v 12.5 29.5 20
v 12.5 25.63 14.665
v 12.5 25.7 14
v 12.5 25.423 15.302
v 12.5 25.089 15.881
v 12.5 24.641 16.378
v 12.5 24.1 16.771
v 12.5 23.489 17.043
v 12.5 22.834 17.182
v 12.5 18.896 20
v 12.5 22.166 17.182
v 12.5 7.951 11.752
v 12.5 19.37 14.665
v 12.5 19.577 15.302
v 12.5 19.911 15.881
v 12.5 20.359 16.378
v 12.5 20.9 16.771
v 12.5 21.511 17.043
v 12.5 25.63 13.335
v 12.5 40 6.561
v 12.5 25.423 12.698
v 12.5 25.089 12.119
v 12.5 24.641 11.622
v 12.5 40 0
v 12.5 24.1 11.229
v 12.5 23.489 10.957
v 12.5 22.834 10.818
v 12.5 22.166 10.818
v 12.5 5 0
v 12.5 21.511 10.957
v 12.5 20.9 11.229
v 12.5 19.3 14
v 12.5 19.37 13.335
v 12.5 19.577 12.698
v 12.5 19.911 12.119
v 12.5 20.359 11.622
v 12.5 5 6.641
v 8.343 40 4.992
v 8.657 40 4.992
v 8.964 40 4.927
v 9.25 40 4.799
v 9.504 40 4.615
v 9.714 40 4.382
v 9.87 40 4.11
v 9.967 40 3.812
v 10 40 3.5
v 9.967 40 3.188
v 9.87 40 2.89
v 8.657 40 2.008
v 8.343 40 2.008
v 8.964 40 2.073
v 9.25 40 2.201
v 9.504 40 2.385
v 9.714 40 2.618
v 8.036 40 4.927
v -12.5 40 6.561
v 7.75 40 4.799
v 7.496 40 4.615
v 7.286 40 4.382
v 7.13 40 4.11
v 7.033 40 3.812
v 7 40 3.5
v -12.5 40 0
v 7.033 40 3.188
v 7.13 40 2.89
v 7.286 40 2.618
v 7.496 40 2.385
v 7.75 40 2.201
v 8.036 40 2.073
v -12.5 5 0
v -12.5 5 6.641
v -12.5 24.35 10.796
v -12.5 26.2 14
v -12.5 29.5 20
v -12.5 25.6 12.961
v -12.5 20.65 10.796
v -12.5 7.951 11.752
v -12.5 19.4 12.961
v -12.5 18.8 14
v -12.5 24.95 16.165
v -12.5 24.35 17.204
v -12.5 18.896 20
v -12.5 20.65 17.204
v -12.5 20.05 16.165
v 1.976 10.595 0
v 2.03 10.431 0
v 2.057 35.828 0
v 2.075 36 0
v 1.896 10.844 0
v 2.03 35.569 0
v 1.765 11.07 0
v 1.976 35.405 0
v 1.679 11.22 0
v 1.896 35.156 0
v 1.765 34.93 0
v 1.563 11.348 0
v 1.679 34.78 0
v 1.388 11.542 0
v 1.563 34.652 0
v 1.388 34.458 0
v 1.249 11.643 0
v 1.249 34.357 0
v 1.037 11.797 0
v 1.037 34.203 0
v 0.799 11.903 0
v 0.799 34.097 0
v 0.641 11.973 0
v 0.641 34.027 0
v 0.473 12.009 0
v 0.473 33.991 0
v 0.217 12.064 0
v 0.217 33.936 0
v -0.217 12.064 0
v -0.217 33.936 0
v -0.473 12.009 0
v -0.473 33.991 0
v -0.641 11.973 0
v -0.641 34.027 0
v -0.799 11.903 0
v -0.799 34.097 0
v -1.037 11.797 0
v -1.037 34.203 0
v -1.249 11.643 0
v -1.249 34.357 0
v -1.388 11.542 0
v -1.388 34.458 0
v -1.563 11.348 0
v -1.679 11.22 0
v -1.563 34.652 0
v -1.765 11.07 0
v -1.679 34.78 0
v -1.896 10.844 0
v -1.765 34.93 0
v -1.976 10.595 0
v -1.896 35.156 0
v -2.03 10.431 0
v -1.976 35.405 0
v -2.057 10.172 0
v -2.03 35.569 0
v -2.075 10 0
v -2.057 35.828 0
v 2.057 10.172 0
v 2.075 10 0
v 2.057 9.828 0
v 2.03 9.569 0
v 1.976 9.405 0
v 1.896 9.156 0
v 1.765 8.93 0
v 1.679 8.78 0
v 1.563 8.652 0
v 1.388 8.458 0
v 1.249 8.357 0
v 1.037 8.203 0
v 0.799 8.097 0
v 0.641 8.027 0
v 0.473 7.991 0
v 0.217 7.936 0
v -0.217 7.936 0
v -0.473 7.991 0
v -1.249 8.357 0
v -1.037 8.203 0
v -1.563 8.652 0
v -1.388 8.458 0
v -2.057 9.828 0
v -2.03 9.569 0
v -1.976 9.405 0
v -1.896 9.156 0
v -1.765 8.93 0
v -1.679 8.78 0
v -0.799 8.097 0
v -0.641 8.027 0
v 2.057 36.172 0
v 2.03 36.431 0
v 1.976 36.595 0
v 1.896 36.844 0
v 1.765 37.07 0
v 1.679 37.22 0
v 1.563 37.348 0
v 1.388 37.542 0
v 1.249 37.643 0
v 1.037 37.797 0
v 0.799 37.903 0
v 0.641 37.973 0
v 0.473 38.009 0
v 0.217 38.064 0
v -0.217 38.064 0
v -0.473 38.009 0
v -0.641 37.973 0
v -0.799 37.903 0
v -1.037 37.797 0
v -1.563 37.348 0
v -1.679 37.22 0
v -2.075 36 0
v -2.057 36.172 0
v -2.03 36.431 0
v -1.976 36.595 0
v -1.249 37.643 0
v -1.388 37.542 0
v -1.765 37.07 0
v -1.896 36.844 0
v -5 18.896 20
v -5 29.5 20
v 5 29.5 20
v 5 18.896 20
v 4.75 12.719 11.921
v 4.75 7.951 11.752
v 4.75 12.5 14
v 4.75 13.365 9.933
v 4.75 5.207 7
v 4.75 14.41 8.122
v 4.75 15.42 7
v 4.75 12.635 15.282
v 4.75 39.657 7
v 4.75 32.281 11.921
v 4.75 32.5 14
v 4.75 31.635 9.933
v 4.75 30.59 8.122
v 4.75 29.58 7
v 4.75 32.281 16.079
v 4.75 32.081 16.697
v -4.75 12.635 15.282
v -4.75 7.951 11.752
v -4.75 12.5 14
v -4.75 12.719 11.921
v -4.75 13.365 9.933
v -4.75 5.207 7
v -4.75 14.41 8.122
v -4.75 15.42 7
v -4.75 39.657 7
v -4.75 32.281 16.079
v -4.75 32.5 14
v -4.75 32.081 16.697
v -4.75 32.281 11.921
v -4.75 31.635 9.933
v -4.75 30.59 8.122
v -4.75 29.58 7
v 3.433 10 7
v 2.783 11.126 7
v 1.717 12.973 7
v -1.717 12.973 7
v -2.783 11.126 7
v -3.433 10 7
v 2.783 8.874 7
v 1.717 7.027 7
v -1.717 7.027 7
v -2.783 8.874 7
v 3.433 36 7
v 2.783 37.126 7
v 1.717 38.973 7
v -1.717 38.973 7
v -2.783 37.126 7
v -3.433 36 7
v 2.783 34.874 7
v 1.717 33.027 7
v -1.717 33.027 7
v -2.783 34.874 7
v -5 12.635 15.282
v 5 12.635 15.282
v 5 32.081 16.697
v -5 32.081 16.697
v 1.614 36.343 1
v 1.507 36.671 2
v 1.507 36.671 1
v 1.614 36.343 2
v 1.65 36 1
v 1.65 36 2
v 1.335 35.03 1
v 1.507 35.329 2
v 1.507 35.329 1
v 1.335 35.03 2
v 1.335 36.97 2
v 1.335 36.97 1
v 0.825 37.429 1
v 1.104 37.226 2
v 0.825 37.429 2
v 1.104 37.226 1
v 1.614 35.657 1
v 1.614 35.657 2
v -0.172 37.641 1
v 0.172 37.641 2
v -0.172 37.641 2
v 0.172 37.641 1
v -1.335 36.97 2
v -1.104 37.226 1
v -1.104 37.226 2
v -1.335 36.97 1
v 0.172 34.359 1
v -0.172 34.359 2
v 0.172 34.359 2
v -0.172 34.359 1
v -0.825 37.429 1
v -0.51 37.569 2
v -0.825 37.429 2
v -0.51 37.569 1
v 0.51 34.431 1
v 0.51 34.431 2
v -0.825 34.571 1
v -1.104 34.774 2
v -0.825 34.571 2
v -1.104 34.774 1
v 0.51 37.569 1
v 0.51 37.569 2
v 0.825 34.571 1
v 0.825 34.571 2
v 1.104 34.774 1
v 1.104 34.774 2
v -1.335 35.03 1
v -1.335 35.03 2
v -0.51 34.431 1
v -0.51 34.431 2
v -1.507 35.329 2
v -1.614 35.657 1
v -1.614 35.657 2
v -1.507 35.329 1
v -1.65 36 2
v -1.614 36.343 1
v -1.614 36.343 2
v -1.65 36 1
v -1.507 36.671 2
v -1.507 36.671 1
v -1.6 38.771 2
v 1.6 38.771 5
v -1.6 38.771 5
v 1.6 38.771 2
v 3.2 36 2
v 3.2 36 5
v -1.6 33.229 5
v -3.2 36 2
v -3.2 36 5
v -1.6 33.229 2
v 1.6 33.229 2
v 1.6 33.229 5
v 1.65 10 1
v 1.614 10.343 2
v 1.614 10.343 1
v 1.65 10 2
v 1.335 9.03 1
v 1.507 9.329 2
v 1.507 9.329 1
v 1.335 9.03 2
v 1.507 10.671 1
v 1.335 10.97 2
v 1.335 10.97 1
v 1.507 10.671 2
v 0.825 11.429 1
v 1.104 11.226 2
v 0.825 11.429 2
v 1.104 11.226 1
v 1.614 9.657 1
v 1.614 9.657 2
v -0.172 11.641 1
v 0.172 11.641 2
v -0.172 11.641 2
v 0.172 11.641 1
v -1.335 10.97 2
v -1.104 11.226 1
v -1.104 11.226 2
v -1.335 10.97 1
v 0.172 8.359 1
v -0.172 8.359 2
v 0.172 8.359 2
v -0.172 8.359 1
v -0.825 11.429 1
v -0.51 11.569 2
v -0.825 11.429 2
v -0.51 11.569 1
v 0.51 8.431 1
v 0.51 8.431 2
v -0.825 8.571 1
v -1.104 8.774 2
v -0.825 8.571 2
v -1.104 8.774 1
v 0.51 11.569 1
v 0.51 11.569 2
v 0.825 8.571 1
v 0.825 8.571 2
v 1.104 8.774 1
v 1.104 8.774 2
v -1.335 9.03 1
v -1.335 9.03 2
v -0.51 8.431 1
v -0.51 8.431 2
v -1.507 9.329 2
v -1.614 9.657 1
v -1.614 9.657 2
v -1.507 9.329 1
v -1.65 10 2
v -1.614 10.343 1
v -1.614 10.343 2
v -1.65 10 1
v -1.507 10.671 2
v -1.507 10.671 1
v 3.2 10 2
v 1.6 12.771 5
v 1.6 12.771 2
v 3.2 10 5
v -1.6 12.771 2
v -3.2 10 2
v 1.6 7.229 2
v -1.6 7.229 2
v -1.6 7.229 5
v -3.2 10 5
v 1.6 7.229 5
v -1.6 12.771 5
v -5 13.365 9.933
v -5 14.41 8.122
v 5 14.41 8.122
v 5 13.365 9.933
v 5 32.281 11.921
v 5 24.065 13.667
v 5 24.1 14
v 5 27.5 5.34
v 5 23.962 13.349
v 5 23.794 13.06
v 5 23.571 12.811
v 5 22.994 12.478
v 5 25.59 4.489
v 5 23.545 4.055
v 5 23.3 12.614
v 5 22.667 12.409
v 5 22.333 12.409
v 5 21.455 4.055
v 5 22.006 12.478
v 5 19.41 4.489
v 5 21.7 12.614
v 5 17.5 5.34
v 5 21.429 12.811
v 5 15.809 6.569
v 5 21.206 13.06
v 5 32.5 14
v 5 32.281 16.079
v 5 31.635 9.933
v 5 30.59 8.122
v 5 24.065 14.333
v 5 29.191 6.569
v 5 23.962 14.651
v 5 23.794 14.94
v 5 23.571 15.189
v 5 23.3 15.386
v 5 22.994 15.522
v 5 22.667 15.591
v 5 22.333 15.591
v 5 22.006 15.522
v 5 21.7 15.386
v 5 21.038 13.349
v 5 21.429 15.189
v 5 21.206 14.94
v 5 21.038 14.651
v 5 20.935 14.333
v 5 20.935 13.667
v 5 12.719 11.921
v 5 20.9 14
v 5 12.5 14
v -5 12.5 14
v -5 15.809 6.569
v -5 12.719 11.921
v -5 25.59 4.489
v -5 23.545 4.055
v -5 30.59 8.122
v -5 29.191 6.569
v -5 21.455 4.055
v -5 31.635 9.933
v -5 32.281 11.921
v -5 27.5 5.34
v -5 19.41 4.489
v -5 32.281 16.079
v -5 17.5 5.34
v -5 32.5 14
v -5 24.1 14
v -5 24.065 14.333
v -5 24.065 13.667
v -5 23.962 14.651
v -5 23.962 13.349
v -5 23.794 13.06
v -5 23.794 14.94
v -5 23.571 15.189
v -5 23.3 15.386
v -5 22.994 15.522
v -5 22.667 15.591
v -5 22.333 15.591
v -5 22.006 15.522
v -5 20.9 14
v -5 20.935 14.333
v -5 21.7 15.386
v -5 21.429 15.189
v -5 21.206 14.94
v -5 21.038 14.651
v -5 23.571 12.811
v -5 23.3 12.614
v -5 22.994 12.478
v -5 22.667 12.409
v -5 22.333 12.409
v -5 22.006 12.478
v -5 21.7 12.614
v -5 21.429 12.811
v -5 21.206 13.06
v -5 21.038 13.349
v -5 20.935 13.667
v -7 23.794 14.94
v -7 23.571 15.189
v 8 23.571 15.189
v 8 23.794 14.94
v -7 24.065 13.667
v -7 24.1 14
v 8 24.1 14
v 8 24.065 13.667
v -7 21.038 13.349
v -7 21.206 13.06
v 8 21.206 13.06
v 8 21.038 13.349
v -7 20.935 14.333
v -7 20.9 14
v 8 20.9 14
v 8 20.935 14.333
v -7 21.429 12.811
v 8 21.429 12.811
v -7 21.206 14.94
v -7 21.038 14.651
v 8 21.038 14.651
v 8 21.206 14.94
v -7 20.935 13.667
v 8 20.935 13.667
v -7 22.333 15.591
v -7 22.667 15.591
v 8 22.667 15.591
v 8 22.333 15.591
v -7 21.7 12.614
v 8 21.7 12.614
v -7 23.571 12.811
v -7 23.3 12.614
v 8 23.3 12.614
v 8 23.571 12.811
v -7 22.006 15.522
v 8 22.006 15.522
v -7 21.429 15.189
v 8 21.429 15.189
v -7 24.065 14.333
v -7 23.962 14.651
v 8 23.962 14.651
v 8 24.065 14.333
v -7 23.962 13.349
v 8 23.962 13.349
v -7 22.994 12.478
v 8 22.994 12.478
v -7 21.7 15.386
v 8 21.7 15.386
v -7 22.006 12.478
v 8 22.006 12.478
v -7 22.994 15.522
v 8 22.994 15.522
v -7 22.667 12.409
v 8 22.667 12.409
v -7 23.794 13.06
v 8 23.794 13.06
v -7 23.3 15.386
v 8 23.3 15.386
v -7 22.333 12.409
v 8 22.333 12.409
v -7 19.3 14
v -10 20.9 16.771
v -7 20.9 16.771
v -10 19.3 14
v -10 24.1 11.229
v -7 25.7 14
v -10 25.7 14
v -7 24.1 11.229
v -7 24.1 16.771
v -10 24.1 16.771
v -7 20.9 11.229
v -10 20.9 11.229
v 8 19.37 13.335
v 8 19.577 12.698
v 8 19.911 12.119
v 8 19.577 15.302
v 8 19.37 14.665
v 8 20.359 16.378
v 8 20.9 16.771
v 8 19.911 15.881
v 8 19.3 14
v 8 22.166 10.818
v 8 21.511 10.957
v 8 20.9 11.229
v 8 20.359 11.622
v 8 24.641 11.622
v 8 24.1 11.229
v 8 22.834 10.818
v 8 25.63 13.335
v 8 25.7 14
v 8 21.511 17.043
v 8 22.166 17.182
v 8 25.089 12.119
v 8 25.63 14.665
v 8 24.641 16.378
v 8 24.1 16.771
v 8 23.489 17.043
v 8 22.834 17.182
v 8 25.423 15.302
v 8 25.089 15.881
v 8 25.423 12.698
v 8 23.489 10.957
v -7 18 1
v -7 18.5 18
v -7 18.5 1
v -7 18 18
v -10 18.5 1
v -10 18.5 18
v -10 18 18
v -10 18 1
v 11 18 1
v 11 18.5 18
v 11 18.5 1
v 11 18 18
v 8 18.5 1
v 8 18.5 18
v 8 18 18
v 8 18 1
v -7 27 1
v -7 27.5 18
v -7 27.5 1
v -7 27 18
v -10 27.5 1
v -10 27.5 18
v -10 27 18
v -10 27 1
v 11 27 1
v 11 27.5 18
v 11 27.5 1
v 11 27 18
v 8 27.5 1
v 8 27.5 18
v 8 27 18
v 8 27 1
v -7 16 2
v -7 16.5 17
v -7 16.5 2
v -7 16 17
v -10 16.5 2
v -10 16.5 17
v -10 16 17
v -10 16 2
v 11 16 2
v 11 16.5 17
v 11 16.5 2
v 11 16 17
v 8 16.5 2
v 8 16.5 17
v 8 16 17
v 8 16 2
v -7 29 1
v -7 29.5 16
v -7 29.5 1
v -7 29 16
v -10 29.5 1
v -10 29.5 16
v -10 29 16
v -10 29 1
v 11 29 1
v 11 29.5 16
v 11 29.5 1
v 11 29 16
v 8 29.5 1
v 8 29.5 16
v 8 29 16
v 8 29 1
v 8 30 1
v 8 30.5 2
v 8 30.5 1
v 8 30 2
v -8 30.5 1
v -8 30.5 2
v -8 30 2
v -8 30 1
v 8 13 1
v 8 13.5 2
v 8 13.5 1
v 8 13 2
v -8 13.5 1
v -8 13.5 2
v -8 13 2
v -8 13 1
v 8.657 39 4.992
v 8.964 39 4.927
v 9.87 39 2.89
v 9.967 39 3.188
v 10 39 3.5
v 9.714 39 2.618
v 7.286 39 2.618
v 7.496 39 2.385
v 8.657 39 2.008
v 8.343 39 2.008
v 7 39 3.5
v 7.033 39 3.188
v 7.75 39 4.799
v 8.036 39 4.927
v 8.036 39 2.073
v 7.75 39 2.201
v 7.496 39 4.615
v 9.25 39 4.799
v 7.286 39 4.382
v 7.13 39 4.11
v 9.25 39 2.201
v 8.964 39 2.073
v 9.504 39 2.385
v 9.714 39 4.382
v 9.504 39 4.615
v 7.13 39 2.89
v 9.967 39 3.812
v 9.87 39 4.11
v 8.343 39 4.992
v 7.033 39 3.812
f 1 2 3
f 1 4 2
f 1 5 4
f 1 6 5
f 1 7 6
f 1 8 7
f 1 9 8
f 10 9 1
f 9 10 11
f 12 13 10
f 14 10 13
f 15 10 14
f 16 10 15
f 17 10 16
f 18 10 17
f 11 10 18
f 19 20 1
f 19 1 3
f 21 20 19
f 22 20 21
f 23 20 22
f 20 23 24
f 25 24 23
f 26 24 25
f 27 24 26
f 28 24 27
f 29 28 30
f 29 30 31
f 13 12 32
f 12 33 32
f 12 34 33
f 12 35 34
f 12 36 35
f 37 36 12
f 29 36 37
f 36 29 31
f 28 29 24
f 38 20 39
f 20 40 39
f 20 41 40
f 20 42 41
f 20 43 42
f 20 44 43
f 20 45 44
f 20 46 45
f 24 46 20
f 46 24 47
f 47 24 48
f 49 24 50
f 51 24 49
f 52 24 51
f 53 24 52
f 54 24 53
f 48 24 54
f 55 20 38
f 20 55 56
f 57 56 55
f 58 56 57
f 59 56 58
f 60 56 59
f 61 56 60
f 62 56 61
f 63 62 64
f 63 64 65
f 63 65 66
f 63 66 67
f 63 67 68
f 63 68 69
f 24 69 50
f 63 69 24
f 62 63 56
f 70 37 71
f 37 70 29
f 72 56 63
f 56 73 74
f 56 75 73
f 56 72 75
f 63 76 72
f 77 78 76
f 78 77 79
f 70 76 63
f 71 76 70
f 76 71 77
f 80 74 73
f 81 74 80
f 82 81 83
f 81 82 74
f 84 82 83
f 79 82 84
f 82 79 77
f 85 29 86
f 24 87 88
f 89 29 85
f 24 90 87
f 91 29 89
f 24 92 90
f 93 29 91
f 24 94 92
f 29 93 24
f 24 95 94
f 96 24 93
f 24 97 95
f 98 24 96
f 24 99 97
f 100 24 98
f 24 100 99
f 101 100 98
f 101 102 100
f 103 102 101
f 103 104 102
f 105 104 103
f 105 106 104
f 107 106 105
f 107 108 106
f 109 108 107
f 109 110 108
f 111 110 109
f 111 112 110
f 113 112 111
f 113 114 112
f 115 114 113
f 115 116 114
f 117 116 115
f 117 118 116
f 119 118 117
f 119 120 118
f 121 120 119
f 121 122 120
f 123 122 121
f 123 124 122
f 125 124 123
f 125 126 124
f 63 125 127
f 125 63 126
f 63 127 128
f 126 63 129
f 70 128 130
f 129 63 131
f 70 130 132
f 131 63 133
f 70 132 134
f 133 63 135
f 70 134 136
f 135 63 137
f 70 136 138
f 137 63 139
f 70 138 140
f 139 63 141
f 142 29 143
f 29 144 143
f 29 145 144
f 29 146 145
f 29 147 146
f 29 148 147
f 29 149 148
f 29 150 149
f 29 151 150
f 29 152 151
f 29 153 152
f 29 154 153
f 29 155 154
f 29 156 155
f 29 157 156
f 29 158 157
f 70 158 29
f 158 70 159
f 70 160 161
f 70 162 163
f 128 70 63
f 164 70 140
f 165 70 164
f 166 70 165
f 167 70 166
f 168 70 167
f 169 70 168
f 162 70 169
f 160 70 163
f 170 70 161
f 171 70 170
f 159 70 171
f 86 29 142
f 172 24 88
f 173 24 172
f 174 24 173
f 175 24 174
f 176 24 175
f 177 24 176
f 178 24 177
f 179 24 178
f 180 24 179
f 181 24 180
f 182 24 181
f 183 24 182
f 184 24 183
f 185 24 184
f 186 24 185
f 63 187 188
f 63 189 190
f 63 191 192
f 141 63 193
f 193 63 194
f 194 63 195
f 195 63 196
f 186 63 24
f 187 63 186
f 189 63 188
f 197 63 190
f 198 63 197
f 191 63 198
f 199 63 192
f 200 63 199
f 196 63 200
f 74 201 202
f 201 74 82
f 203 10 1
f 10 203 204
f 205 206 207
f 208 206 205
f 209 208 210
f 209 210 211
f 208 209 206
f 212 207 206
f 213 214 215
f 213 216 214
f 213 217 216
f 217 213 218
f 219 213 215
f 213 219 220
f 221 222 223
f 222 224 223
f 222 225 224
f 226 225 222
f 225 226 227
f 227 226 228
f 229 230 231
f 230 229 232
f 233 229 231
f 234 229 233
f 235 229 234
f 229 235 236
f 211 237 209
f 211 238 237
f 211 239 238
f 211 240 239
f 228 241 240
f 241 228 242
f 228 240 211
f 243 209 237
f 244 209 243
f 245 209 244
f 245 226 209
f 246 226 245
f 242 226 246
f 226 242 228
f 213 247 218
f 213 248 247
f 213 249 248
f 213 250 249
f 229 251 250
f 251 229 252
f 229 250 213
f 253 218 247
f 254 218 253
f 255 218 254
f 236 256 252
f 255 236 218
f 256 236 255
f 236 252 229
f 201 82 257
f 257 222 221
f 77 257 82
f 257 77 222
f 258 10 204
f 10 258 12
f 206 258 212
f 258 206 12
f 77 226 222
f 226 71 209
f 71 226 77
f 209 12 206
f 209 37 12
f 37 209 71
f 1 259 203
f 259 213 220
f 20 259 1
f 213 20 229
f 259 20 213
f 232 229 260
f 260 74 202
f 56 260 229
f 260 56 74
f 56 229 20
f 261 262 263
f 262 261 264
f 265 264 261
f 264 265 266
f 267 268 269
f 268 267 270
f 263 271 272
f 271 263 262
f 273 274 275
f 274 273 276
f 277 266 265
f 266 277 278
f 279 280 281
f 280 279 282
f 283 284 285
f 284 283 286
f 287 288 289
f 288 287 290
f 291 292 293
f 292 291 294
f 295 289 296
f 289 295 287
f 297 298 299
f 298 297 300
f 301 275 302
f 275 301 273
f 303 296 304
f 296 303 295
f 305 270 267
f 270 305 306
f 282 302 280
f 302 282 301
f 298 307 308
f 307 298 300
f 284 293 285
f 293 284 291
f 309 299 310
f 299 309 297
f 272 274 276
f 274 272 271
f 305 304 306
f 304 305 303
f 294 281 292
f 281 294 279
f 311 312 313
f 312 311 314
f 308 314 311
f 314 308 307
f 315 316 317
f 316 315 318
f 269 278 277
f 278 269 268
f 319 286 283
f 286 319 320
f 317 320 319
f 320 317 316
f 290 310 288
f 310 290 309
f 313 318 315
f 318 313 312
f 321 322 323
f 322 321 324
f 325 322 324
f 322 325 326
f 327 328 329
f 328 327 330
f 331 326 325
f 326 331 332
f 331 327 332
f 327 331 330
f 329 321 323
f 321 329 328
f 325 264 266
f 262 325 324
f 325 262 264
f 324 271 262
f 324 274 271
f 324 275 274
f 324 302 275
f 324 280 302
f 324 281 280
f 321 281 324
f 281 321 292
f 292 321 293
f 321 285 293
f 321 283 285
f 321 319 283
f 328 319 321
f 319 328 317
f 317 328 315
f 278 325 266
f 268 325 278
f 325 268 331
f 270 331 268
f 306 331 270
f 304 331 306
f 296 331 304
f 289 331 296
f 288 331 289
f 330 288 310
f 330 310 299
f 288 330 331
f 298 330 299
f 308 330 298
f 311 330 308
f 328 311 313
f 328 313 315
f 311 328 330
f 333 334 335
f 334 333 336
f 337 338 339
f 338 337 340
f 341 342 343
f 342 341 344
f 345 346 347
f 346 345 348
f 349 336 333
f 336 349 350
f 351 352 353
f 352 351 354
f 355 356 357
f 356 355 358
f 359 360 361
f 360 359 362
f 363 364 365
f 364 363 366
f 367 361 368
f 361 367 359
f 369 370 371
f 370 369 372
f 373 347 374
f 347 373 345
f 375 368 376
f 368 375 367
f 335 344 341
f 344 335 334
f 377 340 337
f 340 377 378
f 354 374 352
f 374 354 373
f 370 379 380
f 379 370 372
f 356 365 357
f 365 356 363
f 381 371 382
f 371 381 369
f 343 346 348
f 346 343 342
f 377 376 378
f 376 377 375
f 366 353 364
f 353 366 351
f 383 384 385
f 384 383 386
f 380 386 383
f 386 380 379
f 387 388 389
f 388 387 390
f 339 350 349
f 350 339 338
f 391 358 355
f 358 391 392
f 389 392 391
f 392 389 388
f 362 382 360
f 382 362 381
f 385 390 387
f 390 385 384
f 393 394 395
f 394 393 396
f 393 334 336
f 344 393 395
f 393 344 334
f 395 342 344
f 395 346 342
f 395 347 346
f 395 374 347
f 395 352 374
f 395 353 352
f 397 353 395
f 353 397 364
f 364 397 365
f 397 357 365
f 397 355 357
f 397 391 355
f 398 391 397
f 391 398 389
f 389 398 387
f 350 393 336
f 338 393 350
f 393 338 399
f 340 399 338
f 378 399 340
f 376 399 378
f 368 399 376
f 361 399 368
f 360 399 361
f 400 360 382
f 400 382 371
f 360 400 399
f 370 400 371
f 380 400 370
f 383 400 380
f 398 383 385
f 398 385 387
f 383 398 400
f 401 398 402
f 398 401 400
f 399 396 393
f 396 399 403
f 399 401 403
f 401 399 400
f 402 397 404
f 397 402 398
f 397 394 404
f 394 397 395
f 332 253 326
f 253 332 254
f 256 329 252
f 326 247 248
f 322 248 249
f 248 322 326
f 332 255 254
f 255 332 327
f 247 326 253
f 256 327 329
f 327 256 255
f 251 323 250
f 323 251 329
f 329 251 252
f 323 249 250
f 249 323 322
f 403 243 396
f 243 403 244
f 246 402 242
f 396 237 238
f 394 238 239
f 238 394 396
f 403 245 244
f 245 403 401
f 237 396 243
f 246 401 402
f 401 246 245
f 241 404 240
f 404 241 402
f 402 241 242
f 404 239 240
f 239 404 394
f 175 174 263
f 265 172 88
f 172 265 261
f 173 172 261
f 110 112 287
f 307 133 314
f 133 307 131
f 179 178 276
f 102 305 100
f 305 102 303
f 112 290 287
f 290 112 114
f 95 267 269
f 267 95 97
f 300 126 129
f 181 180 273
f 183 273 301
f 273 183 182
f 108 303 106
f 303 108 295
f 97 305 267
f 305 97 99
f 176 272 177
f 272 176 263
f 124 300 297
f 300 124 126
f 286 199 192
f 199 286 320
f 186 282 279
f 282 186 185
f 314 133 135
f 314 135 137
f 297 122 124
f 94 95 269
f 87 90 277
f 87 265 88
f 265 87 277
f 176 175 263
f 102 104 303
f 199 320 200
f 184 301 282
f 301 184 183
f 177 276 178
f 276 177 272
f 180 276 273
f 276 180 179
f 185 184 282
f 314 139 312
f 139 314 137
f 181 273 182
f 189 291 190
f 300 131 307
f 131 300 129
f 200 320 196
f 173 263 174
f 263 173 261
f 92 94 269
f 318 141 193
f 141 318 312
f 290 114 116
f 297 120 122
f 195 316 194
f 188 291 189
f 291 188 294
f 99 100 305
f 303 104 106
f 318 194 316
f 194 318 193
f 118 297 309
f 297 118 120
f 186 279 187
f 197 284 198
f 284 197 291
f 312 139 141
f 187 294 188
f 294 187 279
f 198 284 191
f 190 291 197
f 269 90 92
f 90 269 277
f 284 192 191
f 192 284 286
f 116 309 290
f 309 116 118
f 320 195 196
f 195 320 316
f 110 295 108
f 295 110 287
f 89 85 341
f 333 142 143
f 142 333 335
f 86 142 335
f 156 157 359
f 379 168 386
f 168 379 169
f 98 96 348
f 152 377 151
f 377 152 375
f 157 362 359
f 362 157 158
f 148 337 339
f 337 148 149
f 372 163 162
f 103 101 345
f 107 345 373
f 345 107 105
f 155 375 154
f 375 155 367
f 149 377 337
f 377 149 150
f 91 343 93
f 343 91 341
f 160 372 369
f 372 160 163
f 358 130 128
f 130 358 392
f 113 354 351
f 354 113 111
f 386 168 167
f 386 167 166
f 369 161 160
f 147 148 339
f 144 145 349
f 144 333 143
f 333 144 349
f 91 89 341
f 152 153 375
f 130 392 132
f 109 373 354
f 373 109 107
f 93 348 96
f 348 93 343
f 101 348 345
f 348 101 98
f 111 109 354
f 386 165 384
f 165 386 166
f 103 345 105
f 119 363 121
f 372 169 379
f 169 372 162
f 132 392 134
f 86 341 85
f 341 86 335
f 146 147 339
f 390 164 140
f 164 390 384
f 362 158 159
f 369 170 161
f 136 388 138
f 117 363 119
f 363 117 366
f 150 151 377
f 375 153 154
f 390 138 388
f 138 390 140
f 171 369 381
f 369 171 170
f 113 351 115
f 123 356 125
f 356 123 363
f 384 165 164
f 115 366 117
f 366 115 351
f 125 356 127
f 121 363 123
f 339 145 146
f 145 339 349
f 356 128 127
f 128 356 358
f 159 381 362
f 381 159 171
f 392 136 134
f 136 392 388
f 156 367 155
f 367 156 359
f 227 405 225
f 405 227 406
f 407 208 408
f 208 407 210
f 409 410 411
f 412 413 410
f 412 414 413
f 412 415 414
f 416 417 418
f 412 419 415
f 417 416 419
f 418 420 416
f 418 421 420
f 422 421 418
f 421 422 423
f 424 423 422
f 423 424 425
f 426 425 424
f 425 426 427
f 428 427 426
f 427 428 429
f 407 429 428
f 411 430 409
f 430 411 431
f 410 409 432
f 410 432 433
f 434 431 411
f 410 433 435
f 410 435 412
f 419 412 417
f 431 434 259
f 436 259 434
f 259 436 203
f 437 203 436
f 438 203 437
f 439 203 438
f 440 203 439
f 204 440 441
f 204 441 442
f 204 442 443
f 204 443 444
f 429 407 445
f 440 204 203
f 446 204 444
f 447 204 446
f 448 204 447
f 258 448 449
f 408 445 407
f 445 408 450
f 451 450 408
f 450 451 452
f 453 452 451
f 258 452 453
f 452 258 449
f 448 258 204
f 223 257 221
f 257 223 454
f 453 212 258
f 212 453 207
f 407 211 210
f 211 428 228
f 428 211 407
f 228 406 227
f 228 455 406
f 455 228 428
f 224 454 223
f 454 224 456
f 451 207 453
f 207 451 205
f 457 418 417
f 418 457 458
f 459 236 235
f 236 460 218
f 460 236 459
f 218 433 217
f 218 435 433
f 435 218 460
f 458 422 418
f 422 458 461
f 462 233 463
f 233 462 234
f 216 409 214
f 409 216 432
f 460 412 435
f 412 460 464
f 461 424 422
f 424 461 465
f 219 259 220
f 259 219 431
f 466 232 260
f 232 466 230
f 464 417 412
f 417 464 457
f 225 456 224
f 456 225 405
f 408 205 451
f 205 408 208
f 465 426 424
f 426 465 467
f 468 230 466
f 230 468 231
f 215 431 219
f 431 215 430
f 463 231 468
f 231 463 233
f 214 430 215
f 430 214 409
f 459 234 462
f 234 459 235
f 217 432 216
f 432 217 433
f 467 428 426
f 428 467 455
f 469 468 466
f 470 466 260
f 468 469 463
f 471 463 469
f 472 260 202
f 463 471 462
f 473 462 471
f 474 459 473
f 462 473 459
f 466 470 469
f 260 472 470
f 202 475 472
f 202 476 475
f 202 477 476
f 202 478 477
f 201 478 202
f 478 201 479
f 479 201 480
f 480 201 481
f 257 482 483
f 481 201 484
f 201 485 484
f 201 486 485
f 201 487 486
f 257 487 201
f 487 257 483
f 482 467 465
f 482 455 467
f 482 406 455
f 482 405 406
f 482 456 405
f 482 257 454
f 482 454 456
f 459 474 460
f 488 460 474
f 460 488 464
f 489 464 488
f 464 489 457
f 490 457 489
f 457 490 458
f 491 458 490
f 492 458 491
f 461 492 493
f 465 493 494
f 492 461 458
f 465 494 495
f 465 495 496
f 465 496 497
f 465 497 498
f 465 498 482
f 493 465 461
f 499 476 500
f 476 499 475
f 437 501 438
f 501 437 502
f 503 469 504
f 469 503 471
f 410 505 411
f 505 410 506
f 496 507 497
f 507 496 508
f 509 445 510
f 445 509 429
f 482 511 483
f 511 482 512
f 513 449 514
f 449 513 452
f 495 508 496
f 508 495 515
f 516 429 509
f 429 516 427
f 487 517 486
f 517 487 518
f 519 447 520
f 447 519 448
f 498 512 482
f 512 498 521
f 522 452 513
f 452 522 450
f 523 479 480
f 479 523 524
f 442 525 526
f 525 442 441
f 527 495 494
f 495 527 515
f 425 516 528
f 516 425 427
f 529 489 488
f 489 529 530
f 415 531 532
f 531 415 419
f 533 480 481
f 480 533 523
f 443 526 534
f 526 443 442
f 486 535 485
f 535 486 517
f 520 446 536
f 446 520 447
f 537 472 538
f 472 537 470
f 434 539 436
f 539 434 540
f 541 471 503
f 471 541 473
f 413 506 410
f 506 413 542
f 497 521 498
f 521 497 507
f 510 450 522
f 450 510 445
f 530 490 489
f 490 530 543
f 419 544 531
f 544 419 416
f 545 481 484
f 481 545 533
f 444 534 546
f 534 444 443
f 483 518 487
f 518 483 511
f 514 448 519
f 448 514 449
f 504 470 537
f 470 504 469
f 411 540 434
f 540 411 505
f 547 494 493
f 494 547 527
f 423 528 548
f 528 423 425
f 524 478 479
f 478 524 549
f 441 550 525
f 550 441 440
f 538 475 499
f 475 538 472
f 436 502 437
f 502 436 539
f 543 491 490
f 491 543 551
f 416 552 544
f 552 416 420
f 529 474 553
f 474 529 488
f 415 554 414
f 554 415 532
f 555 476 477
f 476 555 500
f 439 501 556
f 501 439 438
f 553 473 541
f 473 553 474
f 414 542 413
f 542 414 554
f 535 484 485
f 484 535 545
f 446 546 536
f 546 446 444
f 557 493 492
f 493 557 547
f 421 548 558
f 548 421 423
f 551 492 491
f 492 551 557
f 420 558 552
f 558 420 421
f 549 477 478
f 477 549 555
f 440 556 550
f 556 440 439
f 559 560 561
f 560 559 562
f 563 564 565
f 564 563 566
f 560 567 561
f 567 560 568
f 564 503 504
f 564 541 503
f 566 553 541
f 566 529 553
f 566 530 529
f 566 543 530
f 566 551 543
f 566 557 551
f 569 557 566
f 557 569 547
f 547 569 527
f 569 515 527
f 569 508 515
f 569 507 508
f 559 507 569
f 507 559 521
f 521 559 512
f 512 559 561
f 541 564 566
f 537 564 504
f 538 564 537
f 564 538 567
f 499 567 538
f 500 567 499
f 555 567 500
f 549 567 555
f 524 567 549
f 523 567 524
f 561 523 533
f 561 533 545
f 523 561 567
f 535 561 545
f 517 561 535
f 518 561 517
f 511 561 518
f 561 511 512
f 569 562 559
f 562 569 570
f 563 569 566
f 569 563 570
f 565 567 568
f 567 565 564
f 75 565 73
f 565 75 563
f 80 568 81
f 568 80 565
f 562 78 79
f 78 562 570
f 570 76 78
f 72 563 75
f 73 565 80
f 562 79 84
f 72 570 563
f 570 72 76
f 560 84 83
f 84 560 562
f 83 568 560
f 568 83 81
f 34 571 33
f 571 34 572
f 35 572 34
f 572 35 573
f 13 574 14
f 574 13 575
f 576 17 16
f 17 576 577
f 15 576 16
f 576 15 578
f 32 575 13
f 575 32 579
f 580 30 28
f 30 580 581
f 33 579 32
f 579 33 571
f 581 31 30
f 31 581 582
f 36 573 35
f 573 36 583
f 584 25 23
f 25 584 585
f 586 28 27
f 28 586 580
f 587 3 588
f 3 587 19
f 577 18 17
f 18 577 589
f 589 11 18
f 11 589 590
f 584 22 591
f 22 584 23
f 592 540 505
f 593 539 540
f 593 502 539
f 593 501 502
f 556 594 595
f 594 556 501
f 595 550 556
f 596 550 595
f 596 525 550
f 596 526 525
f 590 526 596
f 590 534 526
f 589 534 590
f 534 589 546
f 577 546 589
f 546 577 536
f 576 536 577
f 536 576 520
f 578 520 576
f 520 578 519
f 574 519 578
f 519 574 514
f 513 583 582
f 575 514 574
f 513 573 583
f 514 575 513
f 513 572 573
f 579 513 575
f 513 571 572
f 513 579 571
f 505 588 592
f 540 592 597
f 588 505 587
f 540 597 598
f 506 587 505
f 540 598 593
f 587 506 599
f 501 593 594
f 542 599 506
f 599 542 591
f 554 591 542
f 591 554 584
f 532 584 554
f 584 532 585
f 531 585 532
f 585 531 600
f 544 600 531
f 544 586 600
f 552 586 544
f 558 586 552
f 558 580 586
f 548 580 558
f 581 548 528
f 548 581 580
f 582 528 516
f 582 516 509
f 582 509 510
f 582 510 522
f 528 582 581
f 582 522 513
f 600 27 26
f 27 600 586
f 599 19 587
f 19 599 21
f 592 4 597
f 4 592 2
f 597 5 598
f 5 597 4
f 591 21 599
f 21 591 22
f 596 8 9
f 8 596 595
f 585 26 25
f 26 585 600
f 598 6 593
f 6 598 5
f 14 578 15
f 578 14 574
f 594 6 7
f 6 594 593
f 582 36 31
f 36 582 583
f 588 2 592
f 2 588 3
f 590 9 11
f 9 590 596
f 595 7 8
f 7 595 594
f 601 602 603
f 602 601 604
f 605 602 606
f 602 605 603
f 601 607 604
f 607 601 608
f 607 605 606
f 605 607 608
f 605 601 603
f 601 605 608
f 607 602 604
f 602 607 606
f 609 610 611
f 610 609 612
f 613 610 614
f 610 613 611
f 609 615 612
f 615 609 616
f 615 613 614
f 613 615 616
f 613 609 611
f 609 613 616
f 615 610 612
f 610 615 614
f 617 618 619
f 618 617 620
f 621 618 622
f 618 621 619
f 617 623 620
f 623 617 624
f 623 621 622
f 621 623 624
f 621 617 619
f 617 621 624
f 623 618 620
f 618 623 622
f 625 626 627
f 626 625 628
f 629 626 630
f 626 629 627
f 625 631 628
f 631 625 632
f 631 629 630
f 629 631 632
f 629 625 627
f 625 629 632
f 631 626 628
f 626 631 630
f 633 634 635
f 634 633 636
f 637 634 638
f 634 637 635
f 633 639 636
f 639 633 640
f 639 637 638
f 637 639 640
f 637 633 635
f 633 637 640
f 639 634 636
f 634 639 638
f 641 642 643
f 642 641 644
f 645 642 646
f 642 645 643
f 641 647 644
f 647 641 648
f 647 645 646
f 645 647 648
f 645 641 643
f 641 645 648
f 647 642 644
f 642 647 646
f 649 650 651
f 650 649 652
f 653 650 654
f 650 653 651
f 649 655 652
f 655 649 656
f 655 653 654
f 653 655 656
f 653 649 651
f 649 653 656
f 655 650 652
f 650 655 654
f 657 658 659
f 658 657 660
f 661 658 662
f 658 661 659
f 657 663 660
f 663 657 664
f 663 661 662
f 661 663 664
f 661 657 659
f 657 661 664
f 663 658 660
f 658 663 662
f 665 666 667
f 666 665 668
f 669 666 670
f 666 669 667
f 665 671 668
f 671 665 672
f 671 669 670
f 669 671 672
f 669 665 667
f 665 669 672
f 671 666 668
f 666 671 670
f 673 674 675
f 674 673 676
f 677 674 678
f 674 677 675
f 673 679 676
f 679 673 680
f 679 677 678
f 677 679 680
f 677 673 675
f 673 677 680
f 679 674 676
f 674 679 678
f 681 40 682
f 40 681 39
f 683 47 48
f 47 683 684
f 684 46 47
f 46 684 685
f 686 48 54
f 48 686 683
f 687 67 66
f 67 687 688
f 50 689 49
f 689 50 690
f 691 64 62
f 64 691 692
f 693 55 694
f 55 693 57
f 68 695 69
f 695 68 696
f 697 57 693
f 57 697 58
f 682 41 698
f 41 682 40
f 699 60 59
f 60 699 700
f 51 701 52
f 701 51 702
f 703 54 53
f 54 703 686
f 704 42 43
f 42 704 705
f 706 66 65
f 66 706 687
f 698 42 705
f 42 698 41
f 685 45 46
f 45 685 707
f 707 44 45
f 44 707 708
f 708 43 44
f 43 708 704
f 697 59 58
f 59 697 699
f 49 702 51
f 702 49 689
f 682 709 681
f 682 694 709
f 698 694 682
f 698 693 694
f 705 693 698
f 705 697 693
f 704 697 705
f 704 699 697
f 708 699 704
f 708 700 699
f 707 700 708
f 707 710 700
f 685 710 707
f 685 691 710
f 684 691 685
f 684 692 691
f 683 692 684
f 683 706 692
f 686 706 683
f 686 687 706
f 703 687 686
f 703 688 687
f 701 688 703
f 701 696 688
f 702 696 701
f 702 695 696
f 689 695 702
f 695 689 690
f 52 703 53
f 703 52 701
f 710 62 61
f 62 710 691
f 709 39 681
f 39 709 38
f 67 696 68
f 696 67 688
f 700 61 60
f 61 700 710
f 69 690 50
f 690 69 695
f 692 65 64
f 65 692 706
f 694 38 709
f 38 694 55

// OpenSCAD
// PRUSA iteration4
// Y belt idler
// GNU GPL v3
// Josef Průša <iam@josefprusa.cz> and contributors
// http://www.reprap.org/wiki/Prusa_Mendel
// http://prusamendel.org

module Y_belt_idler()
{
    difference()
    { 
        // base block
        translate([-12.5,-20,5]) cube([25,20,35]);
        translate([-4.75,-27,-1]) cube([9.5,20,50]); 
        
        // angled front side   
        translate([-15,-19.5,-15]) rotate([37,0,0]) cube([30,20,40]); 
        translate([-15,-12,-15]) rotate([60,0,0]) cube([30,20,40]); 
        translate([-15,-20,29.5]) rotate([38,0,0]) cube([30,20,20]); 

        // screws
        translate([0,1,36]) rotate([90,0,0]) cylinder( h=25, r=1.65, $fn=30 ); 
        translate([0,-2,36]) rotate([90,0,0]) cylinder( h=6, r=3.2 , $fn=6 ); 
        translate([0,1,10]) rotate([90,0,0]) cylinder( h=25, r=1.65, $fn=30 ); 
        translate([0,-2,10]) rotate([90,0,0]) cylinder( h=6, r=3.2 , $fn=6 ); 
        translate([0,-5,36]) rotate([90,0,0]) cylinder( h=6, r=3.2 , r2=3.9, $fn=6 ); 
        translate([0,-5,10]) rotate([90,0,0]) cylinder( h=6, r=3.2 , r2=3.9, $fn=6 );
        translate([0,1,36]) rotate([90,0,0]) cylinder( h=2, r=2.5, r2=1.65,$fn=30 ); 
        translate([0,1,10]) rotate([90,0,0]) cylinder( h=2, r=2.5, r2=1.65,$fn=30 ); 
        
        // pulley cut
        translate([-5,-14,22.5]) rotate([0,90,0]) cylinder( h=10, r=10, $fn=30 ); 
           
        // pulley screw axis 
        translate([-13.5,-14,22.5]) rotate([0,90,0]) cylinder( h=30, r=1.6, $fn=30 ); 
        translate([-14,-14,22.5]) rotate([0,90,0]) cylinder( h=7, r=3.2, $fn=6 ); 
        translate([-14,-14,22.5]) rotate([0,90,0]) cylinder( h=4, r2=3.2, r1=4, $fn=6 ); 
        translate([8,-14,22.5]) rotate([0,90,0]) cylinder( h=6, r=3.2, $fn=30 ); 
        
        // selective infill
        translate([-10,-18,18]) cube([3,17,0.5]);
        translate([8,-18,18]) cube([3,17,0.5]);
        translate([-10,-18,27]) cube([3,17,0.5]);
        translate([8,-18,27]) cube([3,17,0.5]);
        translate([-10,-17,16]) cube([3,15,0.5]);
        translate([8,-17,16]) cube([3,15,0.5]);
        translate([-10,-16,29]) cube([3,15,0.5]);
        translate([8,-16,29]) cube([3,15,0.5]);
        translate([-8,-2,30]) cube([16,1,0.5]);
        translate([-8,-2,13]) cube([16,1,0.5]);
        
        // upper side mark
        translate([8.5,-3.5,39]) rotate([0,0,0]) cylinder( h=2, r=1.5, $fn=30 ); 
        
        //version   
        //translate([3.5,-0.5,20]) rotate([90,0,180]) linear_extrude(height = 0.6) 
        //{ text("R1",font = "helvetica:style=Bold", size=4, center=true); }
    }
    
}   
    
rotate([-90,0,0]) Y_belt_idler(); 
